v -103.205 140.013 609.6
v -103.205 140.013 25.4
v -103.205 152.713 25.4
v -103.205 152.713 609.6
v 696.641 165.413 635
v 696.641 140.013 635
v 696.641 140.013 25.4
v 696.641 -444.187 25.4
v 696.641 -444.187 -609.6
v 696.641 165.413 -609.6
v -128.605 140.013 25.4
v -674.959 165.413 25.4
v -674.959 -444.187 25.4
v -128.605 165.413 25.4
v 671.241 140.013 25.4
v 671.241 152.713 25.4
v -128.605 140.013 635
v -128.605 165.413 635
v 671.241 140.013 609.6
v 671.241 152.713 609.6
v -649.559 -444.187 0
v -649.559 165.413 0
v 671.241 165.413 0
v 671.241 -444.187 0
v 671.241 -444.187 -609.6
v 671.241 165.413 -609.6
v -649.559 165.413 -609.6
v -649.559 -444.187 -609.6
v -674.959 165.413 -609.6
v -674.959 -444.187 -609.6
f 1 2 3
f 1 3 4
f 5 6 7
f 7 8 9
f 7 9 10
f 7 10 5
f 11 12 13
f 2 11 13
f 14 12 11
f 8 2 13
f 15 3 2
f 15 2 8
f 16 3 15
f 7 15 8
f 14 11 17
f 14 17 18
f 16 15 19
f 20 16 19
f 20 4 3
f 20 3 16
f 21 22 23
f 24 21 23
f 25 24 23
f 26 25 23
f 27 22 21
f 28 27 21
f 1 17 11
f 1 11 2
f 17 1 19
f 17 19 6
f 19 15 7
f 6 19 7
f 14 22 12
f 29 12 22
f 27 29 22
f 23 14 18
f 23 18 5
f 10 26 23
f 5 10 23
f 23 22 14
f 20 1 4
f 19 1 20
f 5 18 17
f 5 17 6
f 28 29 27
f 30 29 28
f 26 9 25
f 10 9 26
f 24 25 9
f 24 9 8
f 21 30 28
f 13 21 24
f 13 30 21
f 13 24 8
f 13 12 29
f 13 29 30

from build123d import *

# Parameters (mm, degrees)
F0_W     = 1371.6
F0_H     = 609.6
F1_DEPTH = 25.4
F2_W     = 609.6
F2_H     = 609.6
F3_DEPTH = 25.4
F4_W     = 609.6
F4_H     = 609.6
F5_DEPTH = 25.4
F6_W     = 825.246
F6_H     = 25.4
F7_DEPTH = 609.6
F8_W     = 774.446
F8_H     = 584.2
F9_DEPTH = 12.7


with BuildPart() as f1:
    # F0 (on Top) → F1 (new body)
    with BuildSketch(Plane.XY):
        with Locations((10.840505, -139.387438)):
            Rectangle(F0_W, F0_H)
    extrude(amount=F1_DEPTH)

    # F2 (on face) → F3 (join)
    with BuildSketch(Plane.YZ.offset(696.640505)):
        with Locations((-139.387438, -304.8)):
            Rectangle(F2_W, F2_H)
    extrude(amount=-F3_DEPTH)

    # F4 (on face) → F5 (join)
    with BuildSketch(Plane(origin=(-674.959495, 0, 0), x_dir=(0, -1, 0), z_dir=(-1, 0, 0))):
        with Locations((139.387438, -304.8)):
            Rectangle(F4_W, F4_H)
    extrude(amount=-F5_DEPTH)

    # F6 (on face) → F7 (join)
    with BuildSketch(Plane.XY.offset(25.4)):
        with Locations((284.017505, 152.712562)):
            Rectangle(F6_W, F6_H)
    extrude(amount=F7_DEPTH)

    # F8 (on face) → F9 (cut)
    with BuildSketch(Plane.XZ.offset(-140.012562)):
        with Locations((284.017505, 317.5)):
            Rectangle(F8_W, F8_H)
    extrude(amount=-F9_DEPTH, mode=Mode.SUBTRACT)


solid = f1.part
